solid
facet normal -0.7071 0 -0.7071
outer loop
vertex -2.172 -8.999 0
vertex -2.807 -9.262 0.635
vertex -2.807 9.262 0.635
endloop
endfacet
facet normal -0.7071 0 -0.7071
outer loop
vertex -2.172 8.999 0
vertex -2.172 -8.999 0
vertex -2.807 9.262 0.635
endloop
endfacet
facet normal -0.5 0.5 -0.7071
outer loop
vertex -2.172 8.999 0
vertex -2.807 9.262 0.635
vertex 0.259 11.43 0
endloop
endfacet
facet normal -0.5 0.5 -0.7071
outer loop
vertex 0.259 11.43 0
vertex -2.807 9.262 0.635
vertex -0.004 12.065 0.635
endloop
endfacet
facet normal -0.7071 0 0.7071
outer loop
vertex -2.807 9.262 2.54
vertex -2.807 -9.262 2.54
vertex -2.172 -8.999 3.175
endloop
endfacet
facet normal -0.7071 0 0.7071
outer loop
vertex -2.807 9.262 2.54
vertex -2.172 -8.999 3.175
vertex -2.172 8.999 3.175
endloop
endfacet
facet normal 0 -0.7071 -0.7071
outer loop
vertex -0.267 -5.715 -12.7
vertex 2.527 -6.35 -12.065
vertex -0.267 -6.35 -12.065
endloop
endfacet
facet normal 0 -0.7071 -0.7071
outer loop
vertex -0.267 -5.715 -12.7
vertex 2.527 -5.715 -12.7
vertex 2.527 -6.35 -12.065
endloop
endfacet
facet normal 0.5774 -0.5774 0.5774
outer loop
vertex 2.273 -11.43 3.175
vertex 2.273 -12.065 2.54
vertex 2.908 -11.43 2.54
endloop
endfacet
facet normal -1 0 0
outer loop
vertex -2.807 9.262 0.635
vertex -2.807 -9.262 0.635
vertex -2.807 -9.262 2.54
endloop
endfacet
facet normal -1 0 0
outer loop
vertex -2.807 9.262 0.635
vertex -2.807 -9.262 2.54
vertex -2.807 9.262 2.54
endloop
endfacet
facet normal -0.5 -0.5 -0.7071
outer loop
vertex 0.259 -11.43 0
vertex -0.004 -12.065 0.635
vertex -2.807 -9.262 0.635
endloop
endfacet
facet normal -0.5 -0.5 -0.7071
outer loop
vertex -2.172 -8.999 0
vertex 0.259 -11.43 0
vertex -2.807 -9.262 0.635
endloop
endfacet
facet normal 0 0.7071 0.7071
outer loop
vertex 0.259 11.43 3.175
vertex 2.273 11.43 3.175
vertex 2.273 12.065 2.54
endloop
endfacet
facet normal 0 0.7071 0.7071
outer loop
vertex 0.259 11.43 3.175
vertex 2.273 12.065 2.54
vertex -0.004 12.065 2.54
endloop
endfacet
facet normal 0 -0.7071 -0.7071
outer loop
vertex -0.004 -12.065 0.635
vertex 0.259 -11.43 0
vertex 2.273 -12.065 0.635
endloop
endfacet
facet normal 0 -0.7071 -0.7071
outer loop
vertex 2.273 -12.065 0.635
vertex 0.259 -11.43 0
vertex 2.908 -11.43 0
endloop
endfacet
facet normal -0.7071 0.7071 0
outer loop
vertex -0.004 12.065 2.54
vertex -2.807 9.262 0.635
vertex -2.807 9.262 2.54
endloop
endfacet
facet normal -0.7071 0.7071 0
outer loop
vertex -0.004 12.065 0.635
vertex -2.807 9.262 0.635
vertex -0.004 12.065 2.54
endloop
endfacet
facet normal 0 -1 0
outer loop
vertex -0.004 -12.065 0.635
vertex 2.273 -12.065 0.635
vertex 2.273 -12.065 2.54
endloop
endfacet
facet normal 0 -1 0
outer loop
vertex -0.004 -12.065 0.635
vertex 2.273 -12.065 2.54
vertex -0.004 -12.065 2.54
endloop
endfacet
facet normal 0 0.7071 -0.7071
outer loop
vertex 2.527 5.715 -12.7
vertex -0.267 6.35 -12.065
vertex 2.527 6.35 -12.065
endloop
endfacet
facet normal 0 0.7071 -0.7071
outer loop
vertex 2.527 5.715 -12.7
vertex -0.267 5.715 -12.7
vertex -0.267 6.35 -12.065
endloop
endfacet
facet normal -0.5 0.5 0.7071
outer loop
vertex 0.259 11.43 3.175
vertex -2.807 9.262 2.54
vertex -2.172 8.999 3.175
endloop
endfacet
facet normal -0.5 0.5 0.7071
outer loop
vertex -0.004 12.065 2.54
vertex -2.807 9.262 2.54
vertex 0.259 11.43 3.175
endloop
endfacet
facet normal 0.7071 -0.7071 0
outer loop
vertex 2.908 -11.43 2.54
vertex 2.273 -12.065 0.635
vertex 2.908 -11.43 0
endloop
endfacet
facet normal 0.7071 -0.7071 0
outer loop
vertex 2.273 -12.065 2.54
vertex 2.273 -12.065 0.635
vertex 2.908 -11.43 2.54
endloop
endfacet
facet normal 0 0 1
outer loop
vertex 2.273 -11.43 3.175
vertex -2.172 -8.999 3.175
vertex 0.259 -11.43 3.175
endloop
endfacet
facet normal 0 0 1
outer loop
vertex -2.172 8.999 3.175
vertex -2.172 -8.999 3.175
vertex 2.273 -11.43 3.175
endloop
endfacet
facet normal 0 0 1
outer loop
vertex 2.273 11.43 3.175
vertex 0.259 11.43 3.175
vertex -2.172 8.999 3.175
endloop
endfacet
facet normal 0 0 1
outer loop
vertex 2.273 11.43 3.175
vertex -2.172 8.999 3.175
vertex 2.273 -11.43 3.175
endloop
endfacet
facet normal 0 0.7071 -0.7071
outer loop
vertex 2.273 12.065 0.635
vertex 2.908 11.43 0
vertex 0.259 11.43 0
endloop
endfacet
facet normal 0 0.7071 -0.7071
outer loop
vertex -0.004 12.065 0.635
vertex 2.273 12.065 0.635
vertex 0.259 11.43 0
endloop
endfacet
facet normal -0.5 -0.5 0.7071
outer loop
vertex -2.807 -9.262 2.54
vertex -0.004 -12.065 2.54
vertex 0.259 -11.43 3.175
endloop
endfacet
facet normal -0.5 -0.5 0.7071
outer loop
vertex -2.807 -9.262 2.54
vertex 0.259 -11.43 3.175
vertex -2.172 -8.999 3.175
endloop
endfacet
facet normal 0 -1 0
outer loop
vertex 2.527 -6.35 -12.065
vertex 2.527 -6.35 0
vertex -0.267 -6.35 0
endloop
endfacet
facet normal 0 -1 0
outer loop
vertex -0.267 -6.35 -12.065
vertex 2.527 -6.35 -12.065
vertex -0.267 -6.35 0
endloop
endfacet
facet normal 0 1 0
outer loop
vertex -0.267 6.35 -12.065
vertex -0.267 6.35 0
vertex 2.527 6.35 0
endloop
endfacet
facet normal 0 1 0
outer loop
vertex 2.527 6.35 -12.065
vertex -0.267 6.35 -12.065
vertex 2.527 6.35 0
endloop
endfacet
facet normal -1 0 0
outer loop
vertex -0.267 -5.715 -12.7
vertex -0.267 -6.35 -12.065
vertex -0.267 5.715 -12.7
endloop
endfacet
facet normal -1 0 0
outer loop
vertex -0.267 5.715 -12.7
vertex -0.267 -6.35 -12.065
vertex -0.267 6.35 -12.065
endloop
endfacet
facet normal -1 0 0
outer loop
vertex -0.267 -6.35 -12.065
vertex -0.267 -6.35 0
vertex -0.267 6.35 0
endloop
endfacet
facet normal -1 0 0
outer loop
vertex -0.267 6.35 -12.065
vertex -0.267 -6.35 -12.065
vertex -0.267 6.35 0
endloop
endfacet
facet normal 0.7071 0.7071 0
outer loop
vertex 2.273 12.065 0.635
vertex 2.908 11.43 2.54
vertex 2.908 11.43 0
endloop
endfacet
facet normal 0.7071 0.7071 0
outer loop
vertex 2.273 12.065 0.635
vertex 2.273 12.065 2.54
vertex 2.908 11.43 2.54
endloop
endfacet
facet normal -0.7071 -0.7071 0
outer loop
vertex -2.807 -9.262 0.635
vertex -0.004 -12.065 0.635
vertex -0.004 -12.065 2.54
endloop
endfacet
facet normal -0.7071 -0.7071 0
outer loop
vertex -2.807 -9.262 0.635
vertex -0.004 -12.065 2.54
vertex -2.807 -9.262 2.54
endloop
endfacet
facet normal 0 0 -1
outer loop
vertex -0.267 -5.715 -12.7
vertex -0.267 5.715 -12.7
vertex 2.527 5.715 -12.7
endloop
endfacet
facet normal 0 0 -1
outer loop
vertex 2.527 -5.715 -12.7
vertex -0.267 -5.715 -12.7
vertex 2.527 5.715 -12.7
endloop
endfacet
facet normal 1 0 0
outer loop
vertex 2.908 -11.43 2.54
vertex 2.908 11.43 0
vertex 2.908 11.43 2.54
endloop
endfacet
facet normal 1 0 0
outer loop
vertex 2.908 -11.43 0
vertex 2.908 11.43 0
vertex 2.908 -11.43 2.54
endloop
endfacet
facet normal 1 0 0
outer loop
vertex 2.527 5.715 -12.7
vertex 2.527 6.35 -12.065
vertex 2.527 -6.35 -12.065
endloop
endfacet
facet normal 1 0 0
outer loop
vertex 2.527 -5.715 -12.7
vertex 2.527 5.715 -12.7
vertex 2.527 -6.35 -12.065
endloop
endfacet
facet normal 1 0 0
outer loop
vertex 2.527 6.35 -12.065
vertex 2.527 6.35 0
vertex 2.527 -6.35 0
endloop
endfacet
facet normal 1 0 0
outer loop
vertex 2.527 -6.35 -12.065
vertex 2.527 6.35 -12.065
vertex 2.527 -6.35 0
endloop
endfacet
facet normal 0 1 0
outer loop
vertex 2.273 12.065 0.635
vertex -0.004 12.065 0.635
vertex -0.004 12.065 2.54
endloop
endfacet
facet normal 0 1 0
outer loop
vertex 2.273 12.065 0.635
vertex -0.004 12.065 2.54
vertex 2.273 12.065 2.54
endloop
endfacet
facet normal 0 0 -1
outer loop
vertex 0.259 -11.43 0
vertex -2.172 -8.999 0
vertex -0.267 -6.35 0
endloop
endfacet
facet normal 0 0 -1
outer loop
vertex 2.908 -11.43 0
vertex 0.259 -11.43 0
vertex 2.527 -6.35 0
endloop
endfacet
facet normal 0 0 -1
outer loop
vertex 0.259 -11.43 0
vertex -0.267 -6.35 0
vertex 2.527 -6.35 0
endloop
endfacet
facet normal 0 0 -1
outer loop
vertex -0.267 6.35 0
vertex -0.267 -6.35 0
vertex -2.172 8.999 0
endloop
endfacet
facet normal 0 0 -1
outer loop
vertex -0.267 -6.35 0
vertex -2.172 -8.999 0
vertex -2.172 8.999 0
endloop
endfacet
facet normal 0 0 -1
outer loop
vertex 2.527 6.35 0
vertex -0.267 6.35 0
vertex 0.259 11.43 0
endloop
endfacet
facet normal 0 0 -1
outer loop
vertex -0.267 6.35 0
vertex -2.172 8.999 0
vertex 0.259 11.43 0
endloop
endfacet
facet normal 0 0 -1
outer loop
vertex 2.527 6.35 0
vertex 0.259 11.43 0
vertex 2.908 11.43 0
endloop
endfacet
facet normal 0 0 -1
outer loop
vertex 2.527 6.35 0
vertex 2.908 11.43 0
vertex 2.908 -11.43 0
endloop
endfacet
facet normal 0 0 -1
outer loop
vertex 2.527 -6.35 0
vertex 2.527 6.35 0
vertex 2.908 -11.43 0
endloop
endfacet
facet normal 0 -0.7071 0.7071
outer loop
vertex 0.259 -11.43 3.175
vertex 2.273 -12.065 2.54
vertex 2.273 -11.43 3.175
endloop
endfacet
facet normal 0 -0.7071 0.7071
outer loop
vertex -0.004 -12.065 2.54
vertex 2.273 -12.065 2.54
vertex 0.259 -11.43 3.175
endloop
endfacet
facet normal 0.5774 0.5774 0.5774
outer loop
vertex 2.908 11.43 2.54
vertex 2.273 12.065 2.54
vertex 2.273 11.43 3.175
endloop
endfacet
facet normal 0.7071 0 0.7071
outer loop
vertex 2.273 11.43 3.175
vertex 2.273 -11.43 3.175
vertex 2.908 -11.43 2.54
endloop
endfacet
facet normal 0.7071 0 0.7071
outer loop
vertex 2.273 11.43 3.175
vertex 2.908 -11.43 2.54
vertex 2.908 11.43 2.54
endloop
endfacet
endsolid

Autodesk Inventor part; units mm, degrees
ref_plane "YZ Plane" through (0, 0, 0) normal (1, 0, 0) x (0, 1, 0)
ref_plane "Work Plane1" through (0, 0, 0) normal (0, 0, 1) x (1, 0, 0)
sketch "Sketch1" plane through (0, 0, 0) normal (0, 0, 1) x (1, 0, 0)
  line L0 (-0.2674, 6.35) -> (2.5266, 6.35)
  line L1 (2.5266, 6.35) -> (2.5266, -6.35)
  line L2 (2.9076, -6.35) -> (-0.2674, -6.35)
  line L3 (-0.2674, -6.35) -> (-0.2674, 6.35)
  line L4 (2.5266, -6.35) -> (-0.2674, -6.35)
  line L5 (-0.2674, -6.35) -> (-0.2674, 6.35)
  line L6 (-0.2674, 6.35) -> (2.5266, 6.35)
  line L7 (2.5266, 6.35) -> (2.5266, -6.35)
  point P0 (0, 0)
  dimension "d0" = 2.794
  dimension "d1" = 12.7
extrude "Extrusion1" add sketch "Sketch1" against normal blind 12.7
ref_plane "Work Plane2" through (0, 0, 0) normal (0, 0, 1) x (1, 0, 0)
sketch "Sketch2" plane through (0, 0, 0) normal (0, 0, 1) x (1, 0, 0)
  line L0 (2.9076, -6.35) -> (-0.2674, -6.35) projected
  line L1 (-0.2674, -6.35) -> (-0.2674, 6.35) projected
  line L2 (-0.2674, 6.35) -> (2.9076, 6.35) projected
  line L3 (2.9076, 10.3713) -> (2.9076, 6.35) projected
  line L4 (2.9076, -6.35) -> (2.9076, -10.3713) projected
  line L5 (-0.2674, 6.35) -> (-0.2674, -6.35) projected
  line L6 (-0.2674, -6.35) -> (2.5266, -6.35) projected
  line L7 (2.5266, -6.35) -> (2.5266, 6.35) projected
  line L8 (2.5266, 6.35) -> (-0.2674, 6.35) projected
  line L9 (-0.2674, 6.35) -> (2.9076, 6.35)
  line L10 (2.9076, 6.35) -> (2.9076, -6.35)
  line L11 (2.9076, -6.35) -> (-0.2674, -6.35)
  line L12 (-0.2674, -6.35) -> (-0.2674, 6.35)
  line L13 (6.0826, -12.065) -> (-0.0044, -12.065) projected
  line L14 (-0.0044, 12.065) -> (6.0826, 12.065) projected
  line L15 (-2.8074, 9.262) -> (-0.0044, 12.065) projected
  line L16 (-2.8074, -9.262) -> (-2.8074, 9.262) projected
  line L17 (-0.0044, -12.065) -> (-2.8074, -9.262) projected
  line L18 (6.0826, -12.065) -> (6.0826, -10.3713) construction
  line L19 (2.9076, -10.3713) -> (6.0826, -10.3713) projected
  line L20 (6.0826, 10.3713) -> (2.9076, 10.3713) projected
  line L21 (6.0826, 10.3713) -> (6.0826, 12.065) construction
  line L22 (2.9076, -10.3713) -> (2.9076, -12.065)
  line L23 (2.9076, 10.3713) -> (2.9076, 12.065)
  point P0 (0, 0)
extrude "Extrusion2" add sketch "Sketch2" along normal blind 3.175
chamfer "Chamfer1" distance 0.635 angle 45 15 edges at (-1.4059, 10.6635, 3.175) (1.4516, 12.065, 3.175) (-2.8074, 0, 3.175) (-1.4059, -10.6635, 3.175) (1.4516, -12.065, 3.175) (1.4516, 12.065, 0) (1.4516, -12.065, 0) (-1.4059, -10.6635, 0) (-2.8074, 0, 0) (-1.4059, 10.6635, 0) (2.9076, 12.065, 1.5875) (2.9076, -12.065, 1.5875) (2.9076, 0, 3.175) (1.1296, 6.35, -12.7) (1.1296, -6.35, -12.7)
properties part number "3114a_Coil Sleeve Lock_V1" material "Acetal Resin, White"
